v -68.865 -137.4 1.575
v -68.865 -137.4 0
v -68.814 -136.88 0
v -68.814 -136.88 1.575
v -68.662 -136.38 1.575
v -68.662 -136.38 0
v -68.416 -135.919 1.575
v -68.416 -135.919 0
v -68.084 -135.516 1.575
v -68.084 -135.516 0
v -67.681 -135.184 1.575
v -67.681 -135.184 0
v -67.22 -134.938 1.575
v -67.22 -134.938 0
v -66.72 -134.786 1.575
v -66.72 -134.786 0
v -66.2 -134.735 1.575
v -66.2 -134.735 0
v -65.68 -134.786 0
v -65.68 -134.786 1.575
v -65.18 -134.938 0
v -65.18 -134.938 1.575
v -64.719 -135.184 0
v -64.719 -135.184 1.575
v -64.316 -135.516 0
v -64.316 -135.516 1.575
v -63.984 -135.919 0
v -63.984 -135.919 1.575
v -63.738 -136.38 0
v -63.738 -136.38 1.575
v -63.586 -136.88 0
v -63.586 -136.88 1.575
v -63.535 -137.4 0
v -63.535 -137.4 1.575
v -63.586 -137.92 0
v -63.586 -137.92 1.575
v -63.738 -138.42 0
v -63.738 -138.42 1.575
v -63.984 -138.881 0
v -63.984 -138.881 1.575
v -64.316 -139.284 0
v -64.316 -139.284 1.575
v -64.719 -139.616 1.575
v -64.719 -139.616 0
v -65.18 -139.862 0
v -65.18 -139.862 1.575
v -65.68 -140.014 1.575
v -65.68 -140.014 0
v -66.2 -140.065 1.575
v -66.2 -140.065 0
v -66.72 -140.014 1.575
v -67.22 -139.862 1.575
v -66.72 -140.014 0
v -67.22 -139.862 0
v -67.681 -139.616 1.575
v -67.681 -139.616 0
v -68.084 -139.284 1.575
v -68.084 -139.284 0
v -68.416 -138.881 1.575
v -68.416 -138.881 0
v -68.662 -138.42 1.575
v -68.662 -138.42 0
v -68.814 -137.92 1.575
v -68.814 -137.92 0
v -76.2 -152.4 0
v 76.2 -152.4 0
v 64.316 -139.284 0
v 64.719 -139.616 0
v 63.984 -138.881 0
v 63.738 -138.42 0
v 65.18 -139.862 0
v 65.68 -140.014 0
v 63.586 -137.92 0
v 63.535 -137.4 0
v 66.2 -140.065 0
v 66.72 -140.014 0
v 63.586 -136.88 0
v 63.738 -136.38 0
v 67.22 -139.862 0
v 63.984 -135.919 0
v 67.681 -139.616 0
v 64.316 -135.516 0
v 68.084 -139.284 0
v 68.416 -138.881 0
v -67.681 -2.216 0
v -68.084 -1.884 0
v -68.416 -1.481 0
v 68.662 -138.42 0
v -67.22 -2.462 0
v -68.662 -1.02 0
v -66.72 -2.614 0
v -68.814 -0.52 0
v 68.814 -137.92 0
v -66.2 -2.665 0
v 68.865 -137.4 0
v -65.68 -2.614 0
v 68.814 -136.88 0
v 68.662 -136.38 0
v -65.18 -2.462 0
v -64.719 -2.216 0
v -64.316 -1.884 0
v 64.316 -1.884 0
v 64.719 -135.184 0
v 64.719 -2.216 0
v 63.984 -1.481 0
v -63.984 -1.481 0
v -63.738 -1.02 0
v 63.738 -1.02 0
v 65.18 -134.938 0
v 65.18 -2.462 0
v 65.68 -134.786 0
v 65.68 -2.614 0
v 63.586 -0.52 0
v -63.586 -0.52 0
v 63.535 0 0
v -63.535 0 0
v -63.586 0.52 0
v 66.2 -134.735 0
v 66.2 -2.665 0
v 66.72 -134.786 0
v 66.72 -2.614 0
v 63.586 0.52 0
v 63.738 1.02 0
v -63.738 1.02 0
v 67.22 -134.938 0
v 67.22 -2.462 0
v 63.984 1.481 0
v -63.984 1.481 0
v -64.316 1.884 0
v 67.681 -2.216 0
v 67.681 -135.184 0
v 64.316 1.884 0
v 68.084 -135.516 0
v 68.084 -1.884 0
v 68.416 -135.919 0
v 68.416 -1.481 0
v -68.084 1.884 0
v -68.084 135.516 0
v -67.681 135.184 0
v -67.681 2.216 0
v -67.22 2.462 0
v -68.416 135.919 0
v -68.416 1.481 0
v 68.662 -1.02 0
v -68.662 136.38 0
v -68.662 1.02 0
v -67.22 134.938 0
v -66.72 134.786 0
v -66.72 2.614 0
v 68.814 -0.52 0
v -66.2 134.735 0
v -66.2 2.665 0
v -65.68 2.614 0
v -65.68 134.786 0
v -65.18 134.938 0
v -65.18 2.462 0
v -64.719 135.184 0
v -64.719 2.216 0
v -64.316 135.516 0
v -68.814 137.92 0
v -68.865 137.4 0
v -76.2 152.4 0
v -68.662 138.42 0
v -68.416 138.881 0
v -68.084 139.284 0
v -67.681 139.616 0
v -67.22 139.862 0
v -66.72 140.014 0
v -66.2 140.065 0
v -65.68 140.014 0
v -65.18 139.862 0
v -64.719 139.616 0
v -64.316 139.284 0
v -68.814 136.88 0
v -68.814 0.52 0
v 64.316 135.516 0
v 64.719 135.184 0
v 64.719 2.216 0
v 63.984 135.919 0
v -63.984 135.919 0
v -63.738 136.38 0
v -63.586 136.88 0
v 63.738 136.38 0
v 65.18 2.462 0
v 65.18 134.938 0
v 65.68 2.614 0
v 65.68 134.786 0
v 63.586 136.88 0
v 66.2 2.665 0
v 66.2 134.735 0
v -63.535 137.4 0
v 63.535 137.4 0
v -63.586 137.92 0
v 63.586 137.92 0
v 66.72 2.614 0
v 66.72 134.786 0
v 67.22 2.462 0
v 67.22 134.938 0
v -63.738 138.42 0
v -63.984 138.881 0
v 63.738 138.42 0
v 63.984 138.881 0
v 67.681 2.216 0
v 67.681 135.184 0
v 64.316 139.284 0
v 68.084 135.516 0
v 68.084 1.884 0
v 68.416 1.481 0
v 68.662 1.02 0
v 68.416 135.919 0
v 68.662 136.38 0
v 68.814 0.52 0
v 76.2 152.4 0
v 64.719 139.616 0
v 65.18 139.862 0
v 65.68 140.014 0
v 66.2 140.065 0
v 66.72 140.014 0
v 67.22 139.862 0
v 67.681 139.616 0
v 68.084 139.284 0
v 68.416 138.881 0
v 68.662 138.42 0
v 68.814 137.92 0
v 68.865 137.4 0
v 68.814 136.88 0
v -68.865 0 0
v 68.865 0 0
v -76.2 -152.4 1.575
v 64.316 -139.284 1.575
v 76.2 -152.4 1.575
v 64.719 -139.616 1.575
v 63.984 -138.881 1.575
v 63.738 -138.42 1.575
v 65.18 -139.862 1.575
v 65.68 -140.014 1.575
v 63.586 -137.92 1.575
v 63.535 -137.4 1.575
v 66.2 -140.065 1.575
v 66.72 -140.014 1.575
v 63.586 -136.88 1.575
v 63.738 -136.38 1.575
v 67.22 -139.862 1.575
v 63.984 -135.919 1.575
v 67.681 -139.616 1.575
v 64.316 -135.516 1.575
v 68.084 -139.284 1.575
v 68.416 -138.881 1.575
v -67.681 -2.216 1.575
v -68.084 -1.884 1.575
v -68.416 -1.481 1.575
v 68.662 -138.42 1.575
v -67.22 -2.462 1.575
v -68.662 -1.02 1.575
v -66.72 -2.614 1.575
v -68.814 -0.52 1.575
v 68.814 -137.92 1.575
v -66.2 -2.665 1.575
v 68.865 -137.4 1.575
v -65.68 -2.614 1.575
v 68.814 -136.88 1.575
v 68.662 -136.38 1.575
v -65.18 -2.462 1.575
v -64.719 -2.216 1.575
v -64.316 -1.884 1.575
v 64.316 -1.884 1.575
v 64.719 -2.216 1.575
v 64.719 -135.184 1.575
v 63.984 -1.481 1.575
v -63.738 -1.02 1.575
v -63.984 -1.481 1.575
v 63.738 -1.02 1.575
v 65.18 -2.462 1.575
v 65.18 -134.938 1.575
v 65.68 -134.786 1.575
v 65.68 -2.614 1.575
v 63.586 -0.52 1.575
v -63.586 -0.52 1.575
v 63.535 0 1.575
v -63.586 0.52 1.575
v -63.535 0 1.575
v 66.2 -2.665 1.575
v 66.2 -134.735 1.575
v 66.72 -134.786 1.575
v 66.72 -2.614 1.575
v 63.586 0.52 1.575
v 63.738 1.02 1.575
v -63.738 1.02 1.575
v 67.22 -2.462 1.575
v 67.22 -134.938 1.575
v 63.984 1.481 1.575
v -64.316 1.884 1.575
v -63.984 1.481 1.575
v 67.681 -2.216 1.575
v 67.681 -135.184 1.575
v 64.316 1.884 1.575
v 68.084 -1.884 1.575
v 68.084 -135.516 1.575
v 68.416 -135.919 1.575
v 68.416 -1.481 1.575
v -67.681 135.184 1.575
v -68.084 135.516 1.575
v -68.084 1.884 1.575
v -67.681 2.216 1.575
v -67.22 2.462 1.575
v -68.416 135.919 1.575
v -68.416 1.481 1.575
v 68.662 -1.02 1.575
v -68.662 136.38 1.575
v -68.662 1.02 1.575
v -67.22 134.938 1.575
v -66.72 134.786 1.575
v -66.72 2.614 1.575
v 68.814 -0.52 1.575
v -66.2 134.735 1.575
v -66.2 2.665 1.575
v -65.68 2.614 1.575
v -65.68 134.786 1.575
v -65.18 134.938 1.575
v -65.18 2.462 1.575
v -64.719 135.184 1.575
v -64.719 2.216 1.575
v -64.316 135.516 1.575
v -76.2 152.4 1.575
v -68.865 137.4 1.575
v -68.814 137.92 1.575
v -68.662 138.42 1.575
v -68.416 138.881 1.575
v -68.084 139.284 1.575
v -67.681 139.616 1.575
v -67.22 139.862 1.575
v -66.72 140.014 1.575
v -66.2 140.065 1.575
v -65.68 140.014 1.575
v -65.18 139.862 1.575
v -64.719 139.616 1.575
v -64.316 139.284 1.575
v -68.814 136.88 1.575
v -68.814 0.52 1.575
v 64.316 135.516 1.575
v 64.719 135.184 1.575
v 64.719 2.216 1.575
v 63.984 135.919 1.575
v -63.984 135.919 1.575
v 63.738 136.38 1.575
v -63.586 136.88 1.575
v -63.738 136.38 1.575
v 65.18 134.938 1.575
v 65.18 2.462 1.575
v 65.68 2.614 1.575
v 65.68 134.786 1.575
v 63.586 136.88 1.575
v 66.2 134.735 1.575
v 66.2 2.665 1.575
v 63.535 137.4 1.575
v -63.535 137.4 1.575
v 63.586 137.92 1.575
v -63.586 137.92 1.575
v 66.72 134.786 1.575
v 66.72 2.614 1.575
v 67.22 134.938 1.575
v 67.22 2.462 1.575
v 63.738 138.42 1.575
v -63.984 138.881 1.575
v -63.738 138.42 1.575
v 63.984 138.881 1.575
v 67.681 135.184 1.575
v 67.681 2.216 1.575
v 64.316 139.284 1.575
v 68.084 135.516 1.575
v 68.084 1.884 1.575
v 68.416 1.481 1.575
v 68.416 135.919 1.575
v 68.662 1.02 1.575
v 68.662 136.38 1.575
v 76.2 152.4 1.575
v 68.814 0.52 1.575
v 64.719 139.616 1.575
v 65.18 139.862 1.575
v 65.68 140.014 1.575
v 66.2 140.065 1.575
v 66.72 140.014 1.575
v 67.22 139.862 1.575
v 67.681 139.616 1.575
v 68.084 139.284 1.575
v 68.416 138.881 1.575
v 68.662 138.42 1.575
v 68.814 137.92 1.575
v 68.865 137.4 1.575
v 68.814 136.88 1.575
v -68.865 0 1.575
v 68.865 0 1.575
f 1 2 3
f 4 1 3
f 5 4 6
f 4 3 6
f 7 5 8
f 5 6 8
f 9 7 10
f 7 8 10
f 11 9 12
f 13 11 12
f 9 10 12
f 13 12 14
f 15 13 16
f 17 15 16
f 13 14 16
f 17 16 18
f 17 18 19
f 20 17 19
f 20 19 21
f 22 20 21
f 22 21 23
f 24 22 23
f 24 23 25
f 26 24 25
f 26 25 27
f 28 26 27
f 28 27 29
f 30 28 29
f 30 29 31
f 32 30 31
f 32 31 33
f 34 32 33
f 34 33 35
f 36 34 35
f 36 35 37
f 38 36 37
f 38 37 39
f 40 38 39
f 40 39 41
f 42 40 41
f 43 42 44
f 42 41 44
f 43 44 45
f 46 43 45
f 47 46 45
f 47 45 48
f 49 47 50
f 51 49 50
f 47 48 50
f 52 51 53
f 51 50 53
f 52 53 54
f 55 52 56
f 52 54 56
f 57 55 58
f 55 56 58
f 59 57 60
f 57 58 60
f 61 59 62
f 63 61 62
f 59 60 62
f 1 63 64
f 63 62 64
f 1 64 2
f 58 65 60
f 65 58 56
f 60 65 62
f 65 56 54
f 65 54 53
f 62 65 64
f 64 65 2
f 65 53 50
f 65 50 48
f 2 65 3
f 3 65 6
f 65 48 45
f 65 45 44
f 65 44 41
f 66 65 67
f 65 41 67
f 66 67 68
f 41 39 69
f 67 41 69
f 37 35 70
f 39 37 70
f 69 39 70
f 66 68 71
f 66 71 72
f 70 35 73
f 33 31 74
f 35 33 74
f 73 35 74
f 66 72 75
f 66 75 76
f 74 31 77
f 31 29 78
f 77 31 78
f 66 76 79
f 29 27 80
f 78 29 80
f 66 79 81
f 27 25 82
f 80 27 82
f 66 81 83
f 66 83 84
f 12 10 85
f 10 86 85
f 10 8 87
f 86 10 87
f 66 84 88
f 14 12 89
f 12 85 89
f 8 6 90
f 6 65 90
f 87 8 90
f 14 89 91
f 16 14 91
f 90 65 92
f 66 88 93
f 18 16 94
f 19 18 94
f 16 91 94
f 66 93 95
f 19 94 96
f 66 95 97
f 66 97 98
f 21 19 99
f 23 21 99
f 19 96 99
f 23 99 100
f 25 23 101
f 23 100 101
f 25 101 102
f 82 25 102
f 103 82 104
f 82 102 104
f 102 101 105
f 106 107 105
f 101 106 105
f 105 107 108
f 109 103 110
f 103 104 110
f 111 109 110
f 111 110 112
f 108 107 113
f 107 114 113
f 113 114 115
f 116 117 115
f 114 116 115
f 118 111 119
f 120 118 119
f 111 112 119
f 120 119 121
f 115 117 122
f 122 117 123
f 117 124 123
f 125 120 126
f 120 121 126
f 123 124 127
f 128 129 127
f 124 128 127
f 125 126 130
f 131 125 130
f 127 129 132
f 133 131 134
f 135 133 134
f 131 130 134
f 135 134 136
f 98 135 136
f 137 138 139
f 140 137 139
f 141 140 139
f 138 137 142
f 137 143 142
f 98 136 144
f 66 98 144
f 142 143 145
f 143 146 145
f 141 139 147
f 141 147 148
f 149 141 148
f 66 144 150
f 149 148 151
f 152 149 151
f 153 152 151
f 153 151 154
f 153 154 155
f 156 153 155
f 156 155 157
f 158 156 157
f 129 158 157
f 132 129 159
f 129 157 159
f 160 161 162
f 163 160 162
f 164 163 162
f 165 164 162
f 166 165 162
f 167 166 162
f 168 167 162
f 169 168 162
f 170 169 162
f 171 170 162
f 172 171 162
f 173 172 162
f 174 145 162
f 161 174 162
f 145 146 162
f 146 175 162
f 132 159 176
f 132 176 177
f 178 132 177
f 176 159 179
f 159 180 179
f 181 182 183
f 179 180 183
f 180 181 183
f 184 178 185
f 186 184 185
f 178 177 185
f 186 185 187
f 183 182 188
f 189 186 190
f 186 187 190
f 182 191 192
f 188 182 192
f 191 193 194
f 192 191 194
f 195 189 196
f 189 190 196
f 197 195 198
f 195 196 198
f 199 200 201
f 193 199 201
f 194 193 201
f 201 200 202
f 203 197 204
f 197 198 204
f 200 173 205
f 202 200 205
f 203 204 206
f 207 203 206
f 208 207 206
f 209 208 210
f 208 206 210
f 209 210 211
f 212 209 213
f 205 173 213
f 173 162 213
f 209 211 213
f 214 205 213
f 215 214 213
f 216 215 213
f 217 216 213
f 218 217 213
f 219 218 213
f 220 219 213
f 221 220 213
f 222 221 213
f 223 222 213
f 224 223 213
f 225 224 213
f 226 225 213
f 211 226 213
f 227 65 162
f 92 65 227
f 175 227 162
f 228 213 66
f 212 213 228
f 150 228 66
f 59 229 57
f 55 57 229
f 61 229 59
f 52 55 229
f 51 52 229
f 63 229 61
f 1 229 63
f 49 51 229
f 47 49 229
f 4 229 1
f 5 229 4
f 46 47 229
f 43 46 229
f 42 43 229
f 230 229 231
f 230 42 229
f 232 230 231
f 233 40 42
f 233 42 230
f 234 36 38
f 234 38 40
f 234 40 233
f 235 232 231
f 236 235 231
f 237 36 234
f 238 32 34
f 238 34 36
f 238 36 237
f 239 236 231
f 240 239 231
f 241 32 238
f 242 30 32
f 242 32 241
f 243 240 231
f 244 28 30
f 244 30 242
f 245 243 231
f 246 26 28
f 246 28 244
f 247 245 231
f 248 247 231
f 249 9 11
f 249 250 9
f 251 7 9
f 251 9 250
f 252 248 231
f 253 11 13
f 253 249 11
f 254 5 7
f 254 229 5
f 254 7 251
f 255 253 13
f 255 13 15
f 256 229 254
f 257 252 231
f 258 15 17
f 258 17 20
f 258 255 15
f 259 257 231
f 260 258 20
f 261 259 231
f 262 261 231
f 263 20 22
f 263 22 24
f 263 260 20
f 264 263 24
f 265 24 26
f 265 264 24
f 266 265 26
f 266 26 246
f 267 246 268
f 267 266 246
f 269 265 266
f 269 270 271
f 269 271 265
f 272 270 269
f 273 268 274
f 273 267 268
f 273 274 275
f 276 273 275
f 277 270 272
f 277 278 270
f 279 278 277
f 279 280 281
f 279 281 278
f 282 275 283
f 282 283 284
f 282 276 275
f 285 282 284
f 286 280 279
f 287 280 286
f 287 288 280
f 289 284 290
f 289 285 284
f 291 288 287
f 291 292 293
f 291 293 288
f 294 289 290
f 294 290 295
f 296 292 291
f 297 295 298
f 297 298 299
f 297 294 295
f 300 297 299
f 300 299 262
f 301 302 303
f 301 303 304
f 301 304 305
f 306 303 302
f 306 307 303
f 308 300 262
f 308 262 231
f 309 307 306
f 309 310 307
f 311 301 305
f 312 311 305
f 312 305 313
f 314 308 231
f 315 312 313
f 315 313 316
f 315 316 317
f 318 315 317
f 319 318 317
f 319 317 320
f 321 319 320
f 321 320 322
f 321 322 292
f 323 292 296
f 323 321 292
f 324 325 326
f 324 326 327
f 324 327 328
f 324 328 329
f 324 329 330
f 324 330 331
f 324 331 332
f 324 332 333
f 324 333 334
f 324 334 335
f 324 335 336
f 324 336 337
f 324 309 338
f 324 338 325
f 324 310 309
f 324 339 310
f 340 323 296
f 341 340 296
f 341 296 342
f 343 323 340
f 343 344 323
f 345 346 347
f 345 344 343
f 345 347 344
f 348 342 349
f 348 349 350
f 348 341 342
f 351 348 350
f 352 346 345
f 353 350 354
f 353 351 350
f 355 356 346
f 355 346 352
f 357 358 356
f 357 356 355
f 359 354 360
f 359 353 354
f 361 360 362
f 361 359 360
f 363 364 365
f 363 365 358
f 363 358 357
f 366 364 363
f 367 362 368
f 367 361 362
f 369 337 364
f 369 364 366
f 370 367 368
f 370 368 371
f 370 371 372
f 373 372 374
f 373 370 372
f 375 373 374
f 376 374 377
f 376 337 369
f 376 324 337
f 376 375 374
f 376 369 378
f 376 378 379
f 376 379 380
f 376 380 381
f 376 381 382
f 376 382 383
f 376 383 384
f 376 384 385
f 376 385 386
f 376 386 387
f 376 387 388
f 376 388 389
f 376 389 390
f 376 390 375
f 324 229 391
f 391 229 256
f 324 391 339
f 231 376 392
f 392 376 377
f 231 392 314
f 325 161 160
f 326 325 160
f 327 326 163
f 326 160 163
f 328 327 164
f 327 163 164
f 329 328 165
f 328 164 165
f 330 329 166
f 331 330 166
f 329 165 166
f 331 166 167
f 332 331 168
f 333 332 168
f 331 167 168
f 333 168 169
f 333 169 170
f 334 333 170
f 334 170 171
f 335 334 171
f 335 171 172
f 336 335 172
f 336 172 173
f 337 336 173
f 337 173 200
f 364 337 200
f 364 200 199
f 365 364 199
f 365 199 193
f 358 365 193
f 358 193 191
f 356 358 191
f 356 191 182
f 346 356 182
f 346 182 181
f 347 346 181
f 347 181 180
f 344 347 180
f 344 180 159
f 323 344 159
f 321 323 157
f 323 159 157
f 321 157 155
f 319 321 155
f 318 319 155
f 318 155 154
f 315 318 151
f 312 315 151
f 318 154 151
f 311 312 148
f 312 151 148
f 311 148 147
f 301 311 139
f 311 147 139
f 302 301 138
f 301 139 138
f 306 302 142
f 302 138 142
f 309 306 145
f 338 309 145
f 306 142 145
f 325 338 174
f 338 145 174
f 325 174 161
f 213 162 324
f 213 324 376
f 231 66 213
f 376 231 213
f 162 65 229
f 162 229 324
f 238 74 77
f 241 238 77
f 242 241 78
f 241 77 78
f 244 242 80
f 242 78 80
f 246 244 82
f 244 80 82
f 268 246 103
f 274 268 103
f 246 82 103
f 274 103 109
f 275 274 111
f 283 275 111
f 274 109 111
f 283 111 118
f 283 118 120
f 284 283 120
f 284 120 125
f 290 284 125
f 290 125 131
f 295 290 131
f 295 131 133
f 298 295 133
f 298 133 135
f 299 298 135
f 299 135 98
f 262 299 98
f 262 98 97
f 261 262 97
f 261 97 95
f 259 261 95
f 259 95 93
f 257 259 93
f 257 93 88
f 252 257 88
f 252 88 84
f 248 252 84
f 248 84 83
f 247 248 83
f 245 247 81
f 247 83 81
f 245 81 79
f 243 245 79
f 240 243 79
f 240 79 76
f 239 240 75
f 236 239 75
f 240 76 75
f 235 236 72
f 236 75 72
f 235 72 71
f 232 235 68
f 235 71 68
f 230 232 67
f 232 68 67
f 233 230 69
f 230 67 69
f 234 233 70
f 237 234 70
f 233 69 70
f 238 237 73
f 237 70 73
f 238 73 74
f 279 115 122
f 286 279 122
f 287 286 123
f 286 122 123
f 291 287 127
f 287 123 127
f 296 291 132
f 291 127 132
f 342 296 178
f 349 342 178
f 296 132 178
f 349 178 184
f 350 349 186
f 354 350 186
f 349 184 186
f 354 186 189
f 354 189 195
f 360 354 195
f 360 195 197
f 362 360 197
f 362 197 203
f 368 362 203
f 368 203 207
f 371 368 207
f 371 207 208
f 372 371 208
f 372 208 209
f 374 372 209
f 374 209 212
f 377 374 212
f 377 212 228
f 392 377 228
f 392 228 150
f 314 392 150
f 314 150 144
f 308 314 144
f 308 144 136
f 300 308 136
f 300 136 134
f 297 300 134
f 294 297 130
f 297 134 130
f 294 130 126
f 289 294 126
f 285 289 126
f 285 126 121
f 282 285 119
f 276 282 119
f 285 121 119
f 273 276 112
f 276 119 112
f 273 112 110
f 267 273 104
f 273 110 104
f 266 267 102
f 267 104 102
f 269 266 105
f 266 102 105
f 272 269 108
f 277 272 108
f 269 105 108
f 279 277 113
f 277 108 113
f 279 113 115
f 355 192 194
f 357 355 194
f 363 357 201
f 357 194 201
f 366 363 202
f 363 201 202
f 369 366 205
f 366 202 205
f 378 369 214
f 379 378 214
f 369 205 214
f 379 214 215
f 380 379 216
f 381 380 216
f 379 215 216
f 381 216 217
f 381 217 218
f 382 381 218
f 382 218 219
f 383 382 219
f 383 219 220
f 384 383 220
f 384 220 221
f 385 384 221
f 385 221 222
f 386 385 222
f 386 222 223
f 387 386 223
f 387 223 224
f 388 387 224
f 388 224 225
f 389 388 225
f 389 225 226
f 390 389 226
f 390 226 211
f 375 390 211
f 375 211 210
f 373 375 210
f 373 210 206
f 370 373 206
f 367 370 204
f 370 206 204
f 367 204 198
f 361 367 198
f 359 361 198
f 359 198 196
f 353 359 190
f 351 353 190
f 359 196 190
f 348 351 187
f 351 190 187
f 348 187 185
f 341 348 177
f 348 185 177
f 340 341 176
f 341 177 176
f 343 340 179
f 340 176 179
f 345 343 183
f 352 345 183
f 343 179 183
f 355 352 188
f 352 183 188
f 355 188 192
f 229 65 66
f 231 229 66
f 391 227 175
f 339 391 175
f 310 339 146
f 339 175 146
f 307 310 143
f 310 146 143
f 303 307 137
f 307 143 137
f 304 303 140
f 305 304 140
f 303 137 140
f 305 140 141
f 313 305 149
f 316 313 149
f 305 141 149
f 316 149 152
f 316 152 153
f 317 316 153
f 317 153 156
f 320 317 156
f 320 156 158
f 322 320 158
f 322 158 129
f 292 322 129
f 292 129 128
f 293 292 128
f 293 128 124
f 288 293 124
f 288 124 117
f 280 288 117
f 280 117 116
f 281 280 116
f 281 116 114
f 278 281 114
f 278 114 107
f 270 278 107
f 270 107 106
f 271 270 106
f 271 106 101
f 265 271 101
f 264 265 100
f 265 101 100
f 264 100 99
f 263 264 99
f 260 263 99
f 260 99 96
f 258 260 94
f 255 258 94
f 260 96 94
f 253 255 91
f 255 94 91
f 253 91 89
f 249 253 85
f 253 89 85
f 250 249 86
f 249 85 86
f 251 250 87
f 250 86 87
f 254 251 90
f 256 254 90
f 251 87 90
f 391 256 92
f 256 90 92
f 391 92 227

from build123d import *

# Parameters (mm, degrees)
SKETCH1_W           = 152.4
SKETCH1_H           = 304.8
BOSS_EXTRUDE1_DEPTH = 1.5748
CUT_EXTRUDE1_REACH  = 172.396
SKETCH2_R           = 2.665


with BuildPart() as part:
    # Sketch1 → Boss-Extrude1 (new body)
    with BuildSketch(Plane.XY):
        Rectangle(SKETCH1_W, SKETCH1_H)
    extrude(amount=BOSS_EXTRUDE1_DEPTH)

    # Sketch2 → Cut-Extrude1 (cut, up to next)
    with BuildSketch(Plane(origin=(0, 0, 0), x_dir=(-1, 0, 0), z_dir=(0, 0, -1)), mode=Mode.PRIVATE) as cut_extrude1_sk1:
        with Locations((-66.2, 137.4)):
            Circle(SKETCH2_R)
    cut_extrude1_tool1 = extrude(cut_extrude1_sk1.sketch, amount=-CUT_EXTRUDE1_REACH, mode=Mode.PRIVATE) & part.part
    # Sketch2 → Cut-Extrude1 (cut, up to next)
    with BuildSketch(Plane(origin=(0, 0, 0), x_dir=(-1, 0, 0), z_dir=(0, 0, -1)), mode=Mode.PRIVATE) as cut_extrude1_sk2:
        with Locations((-66.2, -137.4)):
            Circle(SKETCH2_R)
    cut_extrude1_tool2 = extrude(cut_extrude1_sk2.sketch, amount=-CUT_EXTRUDE1_REACH, mode=Mode.PRIVATE) & part.part
    # Sketch2 → Cut-Extrude1 (cut, up to next)
    with BuildSketch(Plane(origin=(0, 0, 0), x_dir=(-1, 0, 0), z_dir=(0, 0, -1)), mode=Mode.PRIVATE) as cut_extrude1_sk3:
        with Locations((-66.2, 0)):
            Circle(SKETCH2_R)
    cut_extrude1_tool3 = extrude(cut_extrude1_sk3.sketch, amount=-CUT_EXTRUDE1_REACH, mode=Mode.PRIVATE) & part.part
    # Sketch2 → Cut-Extrude1 (cut, up to next)
    with BuildSketch(Plane(origin=(0, 0, 0), x_dir=(-1, 0, 0), z_dir=(0, 0, -1)), mode=Mode.PRIVATE) as cut_extrude1_sk4:
        with Locations((66.2, -137.4)):
            Circle(SKETCH2_R)
    cut_extrude1_tool4 = extrude(cut_extrude1_sk4.sketch, amount=-CUT_EXTRUDE1_REACH, mode=Mode.PRIVATE) & part.part
    # Sketch2 → Cut-Extrude1 (cut, up to next)
    with BuildSketch(Plane(origin=(0, 0, 0), x_dir=(-1, 0, 0), z_dir=(0, 0, -1)), mode=Mode.PRIVATE) as cut_extrude1_sk5:
        with Locations((66.2, 0)):
            Circle(SKETCH2_R)
    cut_extrude1_tool5 = extrude(cut_extrude1_sk5.sketch, amount=-CUT_EXTRUDE1_REACH, mode=Mode.PRIVATE) & part.part
    # Sketch2 → Cut-Extrude1 (cut, up to next)
    with BuildSketch(Plane(origin=(0, 0, 0), x_dir=(-1, 0, 0), z_dir=(0, 0, -1)), mode=Mode.PRIVATE) as cut_extrude1_sk6:
        with Locations((66.2, 137.4)):
            Circle(SKETCH2_R)
    cut_extrude1_tool6 = extrude(cut_extrude1_sk6.sketch, amount=-CUT_EXTRUDE1_REACH, mode=Mode.PRIVATE) & part.part
    add(cut_extrude1_tool1.solids().sort_by_distance((66.2, 137.4, 0))[0], mode=Mode.SUBTRACT)
    add(cut_extrude1_tool2.solids().sort_by_distance((66.2, -137.4, 0))[0], mode=Mode.SUBTRACT)
    add(cut_extrude1_tool3.solids().sort_by_distance((66.2, 0, 0))[0], mode=Mode.SUBTRACT)
    add(cut_extrude1_tool4.solids().sort_by_distance((-66.2, -137.4, 0))[0], mode=Mode.SUBTRACT)
    add(cut_extrude1_tool5.solids().sort_by_distance((-66.2, 0, 0))[0], mode=Mode.SUBTRACT)
    add(cut_extrude1_tool6.solids().sort_by_distance((-66.2, 137.4, 0))[0], mode=Mode.SUBTRACT)


solid = part.part
